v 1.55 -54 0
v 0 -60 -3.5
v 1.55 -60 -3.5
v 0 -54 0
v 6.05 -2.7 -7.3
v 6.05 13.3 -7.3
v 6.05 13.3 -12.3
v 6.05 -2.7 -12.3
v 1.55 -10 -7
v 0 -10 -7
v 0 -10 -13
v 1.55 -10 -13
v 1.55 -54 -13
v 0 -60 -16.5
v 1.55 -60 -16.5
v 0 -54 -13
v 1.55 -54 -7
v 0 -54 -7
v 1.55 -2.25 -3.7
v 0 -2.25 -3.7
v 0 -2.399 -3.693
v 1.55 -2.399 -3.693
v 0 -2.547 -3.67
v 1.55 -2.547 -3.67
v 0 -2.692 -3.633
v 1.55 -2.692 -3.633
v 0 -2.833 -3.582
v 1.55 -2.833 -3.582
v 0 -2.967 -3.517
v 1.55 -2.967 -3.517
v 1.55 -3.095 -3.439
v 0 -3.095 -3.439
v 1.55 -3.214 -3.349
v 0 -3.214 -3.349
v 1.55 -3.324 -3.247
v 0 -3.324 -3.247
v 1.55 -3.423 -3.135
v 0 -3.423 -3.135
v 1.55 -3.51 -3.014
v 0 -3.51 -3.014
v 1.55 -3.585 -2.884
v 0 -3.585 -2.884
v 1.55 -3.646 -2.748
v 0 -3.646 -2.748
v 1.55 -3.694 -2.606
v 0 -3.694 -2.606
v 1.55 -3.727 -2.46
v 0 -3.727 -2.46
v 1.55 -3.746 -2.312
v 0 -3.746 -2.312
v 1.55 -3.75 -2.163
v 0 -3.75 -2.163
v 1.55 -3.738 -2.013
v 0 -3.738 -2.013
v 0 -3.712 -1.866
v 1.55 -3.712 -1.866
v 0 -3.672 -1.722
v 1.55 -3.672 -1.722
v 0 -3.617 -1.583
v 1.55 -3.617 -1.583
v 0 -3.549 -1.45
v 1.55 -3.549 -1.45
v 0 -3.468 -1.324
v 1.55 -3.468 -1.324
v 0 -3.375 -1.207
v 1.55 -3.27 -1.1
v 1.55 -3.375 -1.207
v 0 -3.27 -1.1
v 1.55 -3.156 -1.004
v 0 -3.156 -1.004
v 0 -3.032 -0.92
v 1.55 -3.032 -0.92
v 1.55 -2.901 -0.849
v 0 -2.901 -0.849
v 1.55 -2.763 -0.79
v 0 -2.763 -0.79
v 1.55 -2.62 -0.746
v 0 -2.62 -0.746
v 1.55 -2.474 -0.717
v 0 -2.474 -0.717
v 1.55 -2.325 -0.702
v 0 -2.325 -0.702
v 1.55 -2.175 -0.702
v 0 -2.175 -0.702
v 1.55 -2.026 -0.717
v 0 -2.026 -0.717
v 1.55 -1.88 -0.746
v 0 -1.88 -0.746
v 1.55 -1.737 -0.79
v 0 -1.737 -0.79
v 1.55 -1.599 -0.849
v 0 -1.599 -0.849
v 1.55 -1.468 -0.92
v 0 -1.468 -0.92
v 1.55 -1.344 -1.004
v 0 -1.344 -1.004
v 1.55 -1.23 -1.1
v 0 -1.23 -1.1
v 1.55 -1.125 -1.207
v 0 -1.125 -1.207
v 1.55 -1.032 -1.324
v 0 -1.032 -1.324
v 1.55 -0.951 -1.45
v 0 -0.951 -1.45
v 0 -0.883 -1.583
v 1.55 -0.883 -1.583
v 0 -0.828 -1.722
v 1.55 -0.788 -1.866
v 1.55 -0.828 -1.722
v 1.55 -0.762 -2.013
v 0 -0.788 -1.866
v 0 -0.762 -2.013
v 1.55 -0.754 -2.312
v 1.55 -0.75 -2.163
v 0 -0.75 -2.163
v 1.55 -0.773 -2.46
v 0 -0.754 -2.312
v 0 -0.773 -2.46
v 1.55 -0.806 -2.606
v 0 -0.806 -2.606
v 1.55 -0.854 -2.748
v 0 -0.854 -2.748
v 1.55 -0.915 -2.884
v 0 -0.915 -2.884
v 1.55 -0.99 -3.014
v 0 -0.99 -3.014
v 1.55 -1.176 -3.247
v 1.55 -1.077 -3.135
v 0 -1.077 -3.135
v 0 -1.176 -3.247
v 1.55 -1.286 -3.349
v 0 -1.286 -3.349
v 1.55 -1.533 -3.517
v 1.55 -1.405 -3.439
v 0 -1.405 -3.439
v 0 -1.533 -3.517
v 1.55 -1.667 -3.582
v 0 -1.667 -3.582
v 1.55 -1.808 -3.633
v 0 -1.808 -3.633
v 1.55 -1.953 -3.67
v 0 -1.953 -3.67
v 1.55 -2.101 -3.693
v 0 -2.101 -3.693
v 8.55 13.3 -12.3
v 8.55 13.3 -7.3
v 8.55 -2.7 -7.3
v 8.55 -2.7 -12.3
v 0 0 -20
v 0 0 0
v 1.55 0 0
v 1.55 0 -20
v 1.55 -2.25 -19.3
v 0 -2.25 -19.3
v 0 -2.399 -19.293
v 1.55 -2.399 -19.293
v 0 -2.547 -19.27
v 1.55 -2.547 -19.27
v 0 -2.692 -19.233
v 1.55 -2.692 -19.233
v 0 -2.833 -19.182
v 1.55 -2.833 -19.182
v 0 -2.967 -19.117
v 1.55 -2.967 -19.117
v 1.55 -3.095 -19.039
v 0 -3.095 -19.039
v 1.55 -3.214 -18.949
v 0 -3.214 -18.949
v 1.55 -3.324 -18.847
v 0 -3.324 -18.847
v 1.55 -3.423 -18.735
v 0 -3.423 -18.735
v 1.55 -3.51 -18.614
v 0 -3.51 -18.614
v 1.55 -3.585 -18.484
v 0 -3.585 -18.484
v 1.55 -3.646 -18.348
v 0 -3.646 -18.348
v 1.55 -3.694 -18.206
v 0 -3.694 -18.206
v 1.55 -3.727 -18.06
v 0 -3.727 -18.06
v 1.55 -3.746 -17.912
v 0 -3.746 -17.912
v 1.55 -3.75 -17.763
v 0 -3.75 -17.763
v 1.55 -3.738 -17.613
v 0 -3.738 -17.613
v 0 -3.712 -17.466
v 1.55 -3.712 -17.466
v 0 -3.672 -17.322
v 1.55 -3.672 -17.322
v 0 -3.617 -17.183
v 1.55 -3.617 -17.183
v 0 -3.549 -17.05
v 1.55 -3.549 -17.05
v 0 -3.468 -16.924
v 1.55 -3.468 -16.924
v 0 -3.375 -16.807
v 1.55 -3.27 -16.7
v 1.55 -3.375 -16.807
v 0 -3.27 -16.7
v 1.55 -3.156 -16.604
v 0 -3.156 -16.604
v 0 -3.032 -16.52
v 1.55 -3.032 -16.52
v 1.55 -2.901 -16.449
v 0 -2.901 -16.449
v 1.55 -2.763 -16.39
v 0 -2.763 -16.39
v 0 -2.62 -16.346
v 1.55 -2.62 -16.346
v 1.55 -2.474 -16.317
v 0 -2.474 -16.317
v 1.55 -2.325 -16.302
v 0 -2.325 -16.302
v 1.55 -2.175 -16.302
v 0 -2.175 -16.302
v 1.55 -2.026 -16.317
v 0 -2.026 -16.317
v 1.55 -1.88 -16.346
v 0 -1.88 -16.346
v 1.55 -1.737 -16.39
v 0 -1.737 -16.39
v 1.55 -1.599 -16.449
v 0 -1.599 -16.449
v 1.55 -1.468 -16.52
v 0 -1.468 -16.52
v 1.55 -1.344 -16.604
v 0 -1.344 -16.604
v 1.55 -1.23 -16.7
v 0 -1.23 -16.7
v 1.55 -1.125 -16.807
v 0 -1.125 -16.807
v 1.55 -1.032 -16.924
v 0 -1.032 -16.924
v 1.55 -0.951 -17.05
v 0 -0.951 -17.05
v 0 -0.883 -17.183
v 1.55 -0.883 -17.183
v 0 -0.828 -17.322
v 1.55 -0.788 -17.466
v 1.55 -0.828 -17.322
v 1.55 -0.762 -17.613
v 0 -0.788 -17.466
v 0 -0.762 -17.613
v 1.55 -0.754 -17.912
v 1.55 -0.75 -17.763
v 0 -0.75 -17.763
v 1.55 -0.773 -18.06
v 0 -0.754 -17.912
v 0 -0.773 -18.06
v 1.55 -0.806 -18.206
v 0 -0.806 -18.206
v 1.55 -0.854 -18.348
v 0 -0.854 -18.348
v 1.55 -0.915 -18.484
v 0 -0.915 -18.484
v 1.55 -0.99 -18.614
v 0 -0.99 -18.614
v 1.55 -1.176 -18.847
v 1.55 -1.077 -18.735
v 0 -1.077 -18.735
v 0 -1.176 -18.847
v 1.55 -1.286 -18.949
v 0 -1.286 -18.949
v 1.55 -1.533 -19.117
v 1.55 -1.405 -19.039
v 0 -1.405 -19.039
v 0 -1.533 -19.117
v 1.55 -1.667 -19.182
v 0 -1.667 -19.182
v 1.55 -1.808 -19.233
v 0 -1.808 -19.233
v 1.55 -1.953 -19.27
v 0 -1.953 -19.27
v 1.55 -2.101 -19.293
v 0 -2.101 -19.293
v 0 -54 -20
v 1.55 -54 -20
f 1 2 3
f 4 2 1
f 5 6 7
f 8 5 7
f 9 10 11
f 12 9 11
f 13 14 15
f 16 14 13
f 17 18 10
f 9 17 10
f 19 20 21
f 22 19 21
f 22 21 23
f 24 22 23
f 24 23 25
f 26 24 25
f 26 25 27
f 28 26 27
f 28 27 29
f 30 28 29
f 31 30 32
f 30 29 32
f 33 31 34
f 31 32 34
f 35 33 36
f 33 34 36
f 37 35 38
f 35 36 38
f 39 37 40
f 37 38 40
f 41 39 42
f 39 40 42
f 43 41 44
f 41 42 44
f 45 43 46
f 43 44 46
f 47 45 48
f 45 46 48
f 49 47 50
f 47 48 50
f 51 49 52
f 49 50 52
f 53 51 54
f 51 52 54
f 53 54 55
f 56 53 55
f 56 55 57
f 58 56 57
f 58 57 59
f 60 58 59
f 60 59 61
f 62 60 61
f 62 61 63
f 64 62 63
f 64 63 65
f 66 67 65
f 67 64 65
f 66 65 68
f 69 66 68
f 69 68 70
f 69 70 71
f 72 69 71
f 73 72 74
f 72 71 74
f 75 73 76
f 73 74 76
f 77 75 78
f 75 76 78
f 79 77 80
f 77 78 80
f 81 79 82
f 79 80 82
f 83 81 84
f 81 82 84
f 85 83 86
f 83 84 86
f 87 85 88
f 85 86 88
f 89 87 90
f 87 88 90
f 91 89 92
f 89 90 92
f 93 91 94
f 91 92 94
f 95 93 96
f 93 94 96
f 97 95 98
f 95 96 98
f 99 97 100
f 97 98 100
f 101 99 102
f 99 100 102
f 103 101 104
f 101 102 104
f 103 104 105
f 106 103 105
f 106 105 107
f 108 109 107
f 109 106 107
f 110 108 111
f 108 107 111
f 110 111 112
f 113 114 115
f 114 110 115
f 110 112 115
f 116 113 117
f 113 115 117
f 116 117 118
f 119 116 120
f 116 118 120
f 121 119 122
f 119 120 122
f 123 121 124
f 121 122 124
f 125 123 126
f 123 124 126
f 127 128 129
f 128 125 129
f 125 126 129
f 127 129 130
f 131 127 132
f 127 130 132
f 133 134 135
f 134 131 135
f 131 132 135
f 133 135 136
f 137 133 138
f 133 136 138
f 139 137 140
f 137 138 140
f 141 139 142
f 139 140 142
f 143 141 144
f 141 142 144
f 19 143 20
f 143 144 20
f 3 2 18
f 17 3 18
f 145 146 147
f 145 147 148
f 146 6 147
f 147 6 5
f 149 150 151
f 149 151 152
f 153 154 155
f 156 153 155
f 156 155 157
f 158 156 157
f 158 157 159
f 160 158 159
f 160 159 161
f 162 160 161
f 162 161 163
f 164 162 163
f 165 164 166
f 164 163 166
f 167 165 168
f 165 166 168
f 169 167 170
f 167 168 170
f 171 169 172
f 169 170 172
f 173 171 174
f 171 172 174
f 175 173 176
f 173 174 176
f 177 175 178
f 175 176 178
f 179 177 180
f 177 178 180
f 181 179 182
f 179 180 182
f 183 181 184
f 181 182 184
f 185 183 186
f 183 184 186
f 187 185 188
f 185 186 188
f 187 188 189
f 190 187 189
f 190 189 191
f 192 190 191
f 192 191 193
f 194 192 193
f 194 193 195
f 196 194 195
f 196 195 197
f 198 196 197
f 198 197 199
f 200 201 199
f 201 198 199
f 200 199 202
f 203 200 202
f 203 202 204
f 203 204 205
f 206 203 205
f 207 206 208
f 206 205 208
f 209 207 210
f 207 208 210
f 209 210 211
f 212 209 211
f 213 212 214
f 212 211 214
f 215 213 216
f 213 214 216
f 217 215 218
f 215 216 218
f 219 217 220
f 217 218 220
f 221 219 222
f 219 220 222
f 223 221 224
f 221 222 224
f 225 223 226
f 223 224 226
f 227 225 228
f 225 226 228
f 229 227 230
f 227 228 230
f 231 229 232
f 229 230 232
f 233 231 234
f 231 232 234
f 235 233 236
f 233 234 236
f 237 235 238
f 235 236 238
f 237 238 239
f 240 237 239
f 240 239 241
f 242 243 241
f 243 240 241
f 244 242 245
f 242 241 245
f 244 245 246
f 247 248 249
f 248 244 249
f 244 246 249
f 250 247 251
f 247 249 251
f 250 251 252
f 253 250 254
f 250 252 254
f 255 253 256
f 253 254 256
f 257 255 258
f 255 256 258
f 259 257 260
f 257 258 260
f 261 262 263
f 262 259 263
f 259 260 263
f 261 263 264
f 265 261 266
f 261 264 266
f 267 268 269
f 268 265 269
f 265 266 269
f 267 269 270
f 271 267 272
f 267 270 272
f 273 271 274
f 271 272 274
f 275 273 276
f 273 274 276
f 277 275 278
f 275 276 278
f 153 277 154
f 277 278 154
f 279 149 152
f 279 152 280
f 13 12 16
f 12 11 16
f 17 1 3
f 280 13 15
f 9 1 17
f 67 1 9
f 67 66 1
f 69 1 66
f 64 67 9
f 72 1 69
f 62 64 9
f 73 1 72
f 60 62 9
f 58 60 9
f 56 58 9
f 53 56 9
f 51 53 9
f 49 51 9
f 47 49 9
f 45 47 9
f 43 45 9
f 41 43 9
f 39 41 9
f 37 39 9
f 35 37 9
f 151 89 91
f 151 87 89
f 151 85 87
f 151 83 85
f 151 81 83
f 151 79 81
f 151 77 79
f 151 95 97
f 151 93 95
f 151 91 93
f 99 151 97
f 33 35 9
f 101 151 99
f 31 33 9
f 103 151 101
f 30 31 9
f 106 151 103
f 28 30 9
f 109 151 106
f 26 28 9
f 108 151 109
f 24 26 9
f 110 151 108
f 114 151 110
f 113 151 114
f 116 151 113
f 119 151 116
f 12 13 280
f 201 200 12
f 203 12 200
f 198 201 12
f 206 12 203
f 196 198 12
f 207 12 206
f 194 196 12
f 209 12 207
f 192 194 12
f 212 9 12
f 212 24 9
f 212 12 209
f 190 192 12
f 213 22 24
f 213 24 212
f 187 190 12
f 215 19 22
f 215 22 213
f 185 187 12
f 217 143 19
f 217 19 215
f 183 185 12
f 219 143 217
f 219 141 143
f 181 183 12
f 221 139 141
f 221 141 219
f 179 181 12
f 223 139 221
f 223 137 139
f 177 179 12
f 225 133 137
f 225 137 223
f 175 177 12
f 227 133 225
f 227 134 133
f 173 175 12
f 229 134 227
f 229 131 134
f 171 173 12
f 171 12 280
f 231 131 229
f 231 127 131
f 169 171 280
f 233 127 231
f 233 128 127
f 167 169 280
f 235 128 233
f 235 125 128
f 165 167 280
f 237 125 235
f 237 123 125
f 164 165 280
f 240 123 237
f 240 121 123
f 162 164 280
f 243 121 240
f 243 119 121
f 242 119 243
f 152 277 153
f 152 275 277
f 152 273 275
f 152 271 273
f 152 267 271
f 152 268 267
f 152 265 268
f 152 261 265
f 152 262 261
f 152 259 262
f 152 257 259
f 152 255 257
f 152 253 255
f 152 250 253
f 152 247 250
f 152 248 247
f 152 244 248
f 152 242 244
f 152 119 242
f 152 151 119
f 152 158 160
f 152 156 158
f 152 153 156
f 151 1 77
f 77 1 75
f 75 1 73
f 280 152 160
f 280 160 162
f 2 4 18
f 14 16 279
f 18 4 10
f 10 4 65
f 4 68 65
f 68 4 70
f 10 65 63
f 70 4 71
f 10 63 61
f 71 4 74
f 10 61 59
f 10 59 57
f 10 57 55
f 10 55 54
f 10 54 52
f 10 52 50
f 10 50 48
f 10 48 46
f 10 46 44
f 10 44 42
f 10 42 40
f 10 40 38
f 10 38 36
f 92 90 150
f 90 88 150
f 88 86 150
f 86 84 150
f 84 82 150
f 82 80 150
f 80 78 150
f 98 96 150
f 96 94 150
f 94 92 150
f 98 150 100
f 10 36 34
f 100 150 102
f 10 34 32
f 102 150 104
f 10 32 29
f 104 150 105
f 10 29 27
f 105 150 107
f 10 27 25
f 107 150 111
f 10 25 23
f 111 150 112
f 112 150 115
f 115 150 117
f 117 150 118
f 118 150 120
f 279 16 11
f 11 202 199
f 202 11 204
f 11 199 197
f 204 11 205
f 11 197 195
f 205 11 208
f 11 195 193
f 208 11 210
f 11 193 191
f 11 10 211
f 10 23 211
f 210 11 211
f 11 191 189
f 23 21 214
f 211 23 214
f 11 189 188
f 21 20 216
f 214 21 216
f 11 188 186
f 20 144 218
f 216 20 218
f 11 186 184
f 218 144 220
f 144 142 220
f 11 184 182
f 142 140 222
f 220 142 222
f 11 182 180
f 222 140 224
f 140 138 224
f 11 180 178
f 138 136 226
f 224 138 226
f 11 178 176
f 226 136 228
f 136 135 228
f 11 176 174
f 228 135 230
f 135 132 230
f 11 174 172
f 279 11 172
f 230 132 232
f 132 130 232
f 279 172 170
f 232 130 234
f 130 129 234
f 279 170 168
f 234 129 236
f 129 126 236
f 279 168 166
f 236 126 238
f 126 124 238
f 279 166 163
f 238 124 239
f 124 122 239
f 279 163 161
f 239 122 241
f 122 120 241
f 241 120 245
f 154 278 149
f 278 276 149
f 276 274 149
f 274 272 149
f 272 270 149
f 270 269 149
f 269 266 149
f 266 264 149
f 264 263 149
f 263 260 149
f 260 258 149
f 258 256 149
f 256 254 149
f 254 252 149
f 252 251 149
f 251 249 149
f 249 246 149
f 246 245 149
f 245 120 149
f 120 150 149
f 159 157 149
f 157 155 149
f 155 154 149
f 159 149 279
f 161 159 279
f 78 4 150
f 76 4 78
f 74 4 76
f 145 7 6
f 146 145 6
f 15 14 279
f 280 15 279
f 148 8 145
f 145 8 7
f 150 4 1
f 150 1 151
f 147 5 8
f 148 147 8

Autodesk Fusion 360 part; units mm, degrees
sketch "Sketch1" plane through (0, 0, 0) normal (1, 0, 0) x (0, 0, -1)
  line L0 (0, 0) -> (20, 0)
  line L1 (20, 0) -> (20, -60)
  line L2 (20, -60) -> (0, -60)
  line L3 (0, -60) -> (0, 0)
  line L4 (7, -10) -> (13, -10)
  line L5 (13, -10) -> (13, -60)
  line L6 (13, -60) -> (7, -60)
  line L7 (7, -60) -> (7, -10)
  line L8 (0, -54) -> (7, -54)
  line L9 (13, -54) -> (20, -54)
  line L10 (3.5, -54) -> (3.5, -60)
  line L11 (16.5, -54) -> (16.5, -60)
  line L12 (16.5, -60) -> (13, -54)
  line L13 (16.5, -60) -> (20, -54)
  line L14 (3.5, -60) -> (0, -54)
  line L15 (3.5, -60) -> (7, -54)
  circle A0 centre (2.2, -2.25) radius 1.5
  circle A1 centre (17.8, -2.25) radius 1.5
  dimension "d46" = 60
  dimension "d47" = 20
  dimension "d48" = 6
  dimension "d49" = 50
  dimension "d51" = 3
  dimension "d52" = 2.25
  dimension "d53" = 2.2
  dimension "d54" = 3
  dimension "d55" = 2.25
  dimension "d56" = 2.2
extrude "Extrude1" add sketch "Sketch1" along normal blind 1.55 contours L0 L1 L3 L4 L5 L7 L8 L9 | L8 L10 L14 | L9 L11 L13 | L8 L10 L15 | L9 L11 L12 makes body 1
ref_plane "WorkPlane1" through (6.05, -30, -10) normal (1, 0, 0) x (0, 0, -1)
sketch "Sketch2" plane through (6.05, -30, -10) normal (1, 0, 0) x (0, 0, -1)
  line L0 (-2.7003, 27.3001) -> (2.2997, 27.3001)
  line L1 (2.2997, 27.3001) -> (2.2997, 43.3001)
  line L2 (2.2997, 43.3001) -> (-2.7003, 43.3001)
  line L3 (-2.7003, 43.3001) -> (-2.7003, 27.3001)
  dimension "d60" = 5
  dimension "d61" = 16
extrude "Extrude2" add sketch "Sketch2" along normal blind 2.5 separate body makes body 2
sketch "used for creating hole in the outer box" plane through (0, 0, 0) normal (0, 1, 0) x (-1, 0, 0)
  line L0 (0, -20) -> (0, 0)
  line L1 (0, 0) -> (-1.55, 0)
  line L2 (-1.55, 0) -> (-1.55, -20)
  line L3 (-1.55, -20) -> (0, -20)
  line L4 (-1.55, -20.5) -> (0, -20.5)
  line L5 (0, -20.5) -> (0, 0.5)
  line L6 (0, 0.5) -> (-1.55, 0.5)
  line L7 (-1.55, 0.5) -> (-1.55, -20.5)
  line L8 (0, 0) -> (0, -20)
  dimension "d181" = 0.5
  dimension "d182" = 0.5
